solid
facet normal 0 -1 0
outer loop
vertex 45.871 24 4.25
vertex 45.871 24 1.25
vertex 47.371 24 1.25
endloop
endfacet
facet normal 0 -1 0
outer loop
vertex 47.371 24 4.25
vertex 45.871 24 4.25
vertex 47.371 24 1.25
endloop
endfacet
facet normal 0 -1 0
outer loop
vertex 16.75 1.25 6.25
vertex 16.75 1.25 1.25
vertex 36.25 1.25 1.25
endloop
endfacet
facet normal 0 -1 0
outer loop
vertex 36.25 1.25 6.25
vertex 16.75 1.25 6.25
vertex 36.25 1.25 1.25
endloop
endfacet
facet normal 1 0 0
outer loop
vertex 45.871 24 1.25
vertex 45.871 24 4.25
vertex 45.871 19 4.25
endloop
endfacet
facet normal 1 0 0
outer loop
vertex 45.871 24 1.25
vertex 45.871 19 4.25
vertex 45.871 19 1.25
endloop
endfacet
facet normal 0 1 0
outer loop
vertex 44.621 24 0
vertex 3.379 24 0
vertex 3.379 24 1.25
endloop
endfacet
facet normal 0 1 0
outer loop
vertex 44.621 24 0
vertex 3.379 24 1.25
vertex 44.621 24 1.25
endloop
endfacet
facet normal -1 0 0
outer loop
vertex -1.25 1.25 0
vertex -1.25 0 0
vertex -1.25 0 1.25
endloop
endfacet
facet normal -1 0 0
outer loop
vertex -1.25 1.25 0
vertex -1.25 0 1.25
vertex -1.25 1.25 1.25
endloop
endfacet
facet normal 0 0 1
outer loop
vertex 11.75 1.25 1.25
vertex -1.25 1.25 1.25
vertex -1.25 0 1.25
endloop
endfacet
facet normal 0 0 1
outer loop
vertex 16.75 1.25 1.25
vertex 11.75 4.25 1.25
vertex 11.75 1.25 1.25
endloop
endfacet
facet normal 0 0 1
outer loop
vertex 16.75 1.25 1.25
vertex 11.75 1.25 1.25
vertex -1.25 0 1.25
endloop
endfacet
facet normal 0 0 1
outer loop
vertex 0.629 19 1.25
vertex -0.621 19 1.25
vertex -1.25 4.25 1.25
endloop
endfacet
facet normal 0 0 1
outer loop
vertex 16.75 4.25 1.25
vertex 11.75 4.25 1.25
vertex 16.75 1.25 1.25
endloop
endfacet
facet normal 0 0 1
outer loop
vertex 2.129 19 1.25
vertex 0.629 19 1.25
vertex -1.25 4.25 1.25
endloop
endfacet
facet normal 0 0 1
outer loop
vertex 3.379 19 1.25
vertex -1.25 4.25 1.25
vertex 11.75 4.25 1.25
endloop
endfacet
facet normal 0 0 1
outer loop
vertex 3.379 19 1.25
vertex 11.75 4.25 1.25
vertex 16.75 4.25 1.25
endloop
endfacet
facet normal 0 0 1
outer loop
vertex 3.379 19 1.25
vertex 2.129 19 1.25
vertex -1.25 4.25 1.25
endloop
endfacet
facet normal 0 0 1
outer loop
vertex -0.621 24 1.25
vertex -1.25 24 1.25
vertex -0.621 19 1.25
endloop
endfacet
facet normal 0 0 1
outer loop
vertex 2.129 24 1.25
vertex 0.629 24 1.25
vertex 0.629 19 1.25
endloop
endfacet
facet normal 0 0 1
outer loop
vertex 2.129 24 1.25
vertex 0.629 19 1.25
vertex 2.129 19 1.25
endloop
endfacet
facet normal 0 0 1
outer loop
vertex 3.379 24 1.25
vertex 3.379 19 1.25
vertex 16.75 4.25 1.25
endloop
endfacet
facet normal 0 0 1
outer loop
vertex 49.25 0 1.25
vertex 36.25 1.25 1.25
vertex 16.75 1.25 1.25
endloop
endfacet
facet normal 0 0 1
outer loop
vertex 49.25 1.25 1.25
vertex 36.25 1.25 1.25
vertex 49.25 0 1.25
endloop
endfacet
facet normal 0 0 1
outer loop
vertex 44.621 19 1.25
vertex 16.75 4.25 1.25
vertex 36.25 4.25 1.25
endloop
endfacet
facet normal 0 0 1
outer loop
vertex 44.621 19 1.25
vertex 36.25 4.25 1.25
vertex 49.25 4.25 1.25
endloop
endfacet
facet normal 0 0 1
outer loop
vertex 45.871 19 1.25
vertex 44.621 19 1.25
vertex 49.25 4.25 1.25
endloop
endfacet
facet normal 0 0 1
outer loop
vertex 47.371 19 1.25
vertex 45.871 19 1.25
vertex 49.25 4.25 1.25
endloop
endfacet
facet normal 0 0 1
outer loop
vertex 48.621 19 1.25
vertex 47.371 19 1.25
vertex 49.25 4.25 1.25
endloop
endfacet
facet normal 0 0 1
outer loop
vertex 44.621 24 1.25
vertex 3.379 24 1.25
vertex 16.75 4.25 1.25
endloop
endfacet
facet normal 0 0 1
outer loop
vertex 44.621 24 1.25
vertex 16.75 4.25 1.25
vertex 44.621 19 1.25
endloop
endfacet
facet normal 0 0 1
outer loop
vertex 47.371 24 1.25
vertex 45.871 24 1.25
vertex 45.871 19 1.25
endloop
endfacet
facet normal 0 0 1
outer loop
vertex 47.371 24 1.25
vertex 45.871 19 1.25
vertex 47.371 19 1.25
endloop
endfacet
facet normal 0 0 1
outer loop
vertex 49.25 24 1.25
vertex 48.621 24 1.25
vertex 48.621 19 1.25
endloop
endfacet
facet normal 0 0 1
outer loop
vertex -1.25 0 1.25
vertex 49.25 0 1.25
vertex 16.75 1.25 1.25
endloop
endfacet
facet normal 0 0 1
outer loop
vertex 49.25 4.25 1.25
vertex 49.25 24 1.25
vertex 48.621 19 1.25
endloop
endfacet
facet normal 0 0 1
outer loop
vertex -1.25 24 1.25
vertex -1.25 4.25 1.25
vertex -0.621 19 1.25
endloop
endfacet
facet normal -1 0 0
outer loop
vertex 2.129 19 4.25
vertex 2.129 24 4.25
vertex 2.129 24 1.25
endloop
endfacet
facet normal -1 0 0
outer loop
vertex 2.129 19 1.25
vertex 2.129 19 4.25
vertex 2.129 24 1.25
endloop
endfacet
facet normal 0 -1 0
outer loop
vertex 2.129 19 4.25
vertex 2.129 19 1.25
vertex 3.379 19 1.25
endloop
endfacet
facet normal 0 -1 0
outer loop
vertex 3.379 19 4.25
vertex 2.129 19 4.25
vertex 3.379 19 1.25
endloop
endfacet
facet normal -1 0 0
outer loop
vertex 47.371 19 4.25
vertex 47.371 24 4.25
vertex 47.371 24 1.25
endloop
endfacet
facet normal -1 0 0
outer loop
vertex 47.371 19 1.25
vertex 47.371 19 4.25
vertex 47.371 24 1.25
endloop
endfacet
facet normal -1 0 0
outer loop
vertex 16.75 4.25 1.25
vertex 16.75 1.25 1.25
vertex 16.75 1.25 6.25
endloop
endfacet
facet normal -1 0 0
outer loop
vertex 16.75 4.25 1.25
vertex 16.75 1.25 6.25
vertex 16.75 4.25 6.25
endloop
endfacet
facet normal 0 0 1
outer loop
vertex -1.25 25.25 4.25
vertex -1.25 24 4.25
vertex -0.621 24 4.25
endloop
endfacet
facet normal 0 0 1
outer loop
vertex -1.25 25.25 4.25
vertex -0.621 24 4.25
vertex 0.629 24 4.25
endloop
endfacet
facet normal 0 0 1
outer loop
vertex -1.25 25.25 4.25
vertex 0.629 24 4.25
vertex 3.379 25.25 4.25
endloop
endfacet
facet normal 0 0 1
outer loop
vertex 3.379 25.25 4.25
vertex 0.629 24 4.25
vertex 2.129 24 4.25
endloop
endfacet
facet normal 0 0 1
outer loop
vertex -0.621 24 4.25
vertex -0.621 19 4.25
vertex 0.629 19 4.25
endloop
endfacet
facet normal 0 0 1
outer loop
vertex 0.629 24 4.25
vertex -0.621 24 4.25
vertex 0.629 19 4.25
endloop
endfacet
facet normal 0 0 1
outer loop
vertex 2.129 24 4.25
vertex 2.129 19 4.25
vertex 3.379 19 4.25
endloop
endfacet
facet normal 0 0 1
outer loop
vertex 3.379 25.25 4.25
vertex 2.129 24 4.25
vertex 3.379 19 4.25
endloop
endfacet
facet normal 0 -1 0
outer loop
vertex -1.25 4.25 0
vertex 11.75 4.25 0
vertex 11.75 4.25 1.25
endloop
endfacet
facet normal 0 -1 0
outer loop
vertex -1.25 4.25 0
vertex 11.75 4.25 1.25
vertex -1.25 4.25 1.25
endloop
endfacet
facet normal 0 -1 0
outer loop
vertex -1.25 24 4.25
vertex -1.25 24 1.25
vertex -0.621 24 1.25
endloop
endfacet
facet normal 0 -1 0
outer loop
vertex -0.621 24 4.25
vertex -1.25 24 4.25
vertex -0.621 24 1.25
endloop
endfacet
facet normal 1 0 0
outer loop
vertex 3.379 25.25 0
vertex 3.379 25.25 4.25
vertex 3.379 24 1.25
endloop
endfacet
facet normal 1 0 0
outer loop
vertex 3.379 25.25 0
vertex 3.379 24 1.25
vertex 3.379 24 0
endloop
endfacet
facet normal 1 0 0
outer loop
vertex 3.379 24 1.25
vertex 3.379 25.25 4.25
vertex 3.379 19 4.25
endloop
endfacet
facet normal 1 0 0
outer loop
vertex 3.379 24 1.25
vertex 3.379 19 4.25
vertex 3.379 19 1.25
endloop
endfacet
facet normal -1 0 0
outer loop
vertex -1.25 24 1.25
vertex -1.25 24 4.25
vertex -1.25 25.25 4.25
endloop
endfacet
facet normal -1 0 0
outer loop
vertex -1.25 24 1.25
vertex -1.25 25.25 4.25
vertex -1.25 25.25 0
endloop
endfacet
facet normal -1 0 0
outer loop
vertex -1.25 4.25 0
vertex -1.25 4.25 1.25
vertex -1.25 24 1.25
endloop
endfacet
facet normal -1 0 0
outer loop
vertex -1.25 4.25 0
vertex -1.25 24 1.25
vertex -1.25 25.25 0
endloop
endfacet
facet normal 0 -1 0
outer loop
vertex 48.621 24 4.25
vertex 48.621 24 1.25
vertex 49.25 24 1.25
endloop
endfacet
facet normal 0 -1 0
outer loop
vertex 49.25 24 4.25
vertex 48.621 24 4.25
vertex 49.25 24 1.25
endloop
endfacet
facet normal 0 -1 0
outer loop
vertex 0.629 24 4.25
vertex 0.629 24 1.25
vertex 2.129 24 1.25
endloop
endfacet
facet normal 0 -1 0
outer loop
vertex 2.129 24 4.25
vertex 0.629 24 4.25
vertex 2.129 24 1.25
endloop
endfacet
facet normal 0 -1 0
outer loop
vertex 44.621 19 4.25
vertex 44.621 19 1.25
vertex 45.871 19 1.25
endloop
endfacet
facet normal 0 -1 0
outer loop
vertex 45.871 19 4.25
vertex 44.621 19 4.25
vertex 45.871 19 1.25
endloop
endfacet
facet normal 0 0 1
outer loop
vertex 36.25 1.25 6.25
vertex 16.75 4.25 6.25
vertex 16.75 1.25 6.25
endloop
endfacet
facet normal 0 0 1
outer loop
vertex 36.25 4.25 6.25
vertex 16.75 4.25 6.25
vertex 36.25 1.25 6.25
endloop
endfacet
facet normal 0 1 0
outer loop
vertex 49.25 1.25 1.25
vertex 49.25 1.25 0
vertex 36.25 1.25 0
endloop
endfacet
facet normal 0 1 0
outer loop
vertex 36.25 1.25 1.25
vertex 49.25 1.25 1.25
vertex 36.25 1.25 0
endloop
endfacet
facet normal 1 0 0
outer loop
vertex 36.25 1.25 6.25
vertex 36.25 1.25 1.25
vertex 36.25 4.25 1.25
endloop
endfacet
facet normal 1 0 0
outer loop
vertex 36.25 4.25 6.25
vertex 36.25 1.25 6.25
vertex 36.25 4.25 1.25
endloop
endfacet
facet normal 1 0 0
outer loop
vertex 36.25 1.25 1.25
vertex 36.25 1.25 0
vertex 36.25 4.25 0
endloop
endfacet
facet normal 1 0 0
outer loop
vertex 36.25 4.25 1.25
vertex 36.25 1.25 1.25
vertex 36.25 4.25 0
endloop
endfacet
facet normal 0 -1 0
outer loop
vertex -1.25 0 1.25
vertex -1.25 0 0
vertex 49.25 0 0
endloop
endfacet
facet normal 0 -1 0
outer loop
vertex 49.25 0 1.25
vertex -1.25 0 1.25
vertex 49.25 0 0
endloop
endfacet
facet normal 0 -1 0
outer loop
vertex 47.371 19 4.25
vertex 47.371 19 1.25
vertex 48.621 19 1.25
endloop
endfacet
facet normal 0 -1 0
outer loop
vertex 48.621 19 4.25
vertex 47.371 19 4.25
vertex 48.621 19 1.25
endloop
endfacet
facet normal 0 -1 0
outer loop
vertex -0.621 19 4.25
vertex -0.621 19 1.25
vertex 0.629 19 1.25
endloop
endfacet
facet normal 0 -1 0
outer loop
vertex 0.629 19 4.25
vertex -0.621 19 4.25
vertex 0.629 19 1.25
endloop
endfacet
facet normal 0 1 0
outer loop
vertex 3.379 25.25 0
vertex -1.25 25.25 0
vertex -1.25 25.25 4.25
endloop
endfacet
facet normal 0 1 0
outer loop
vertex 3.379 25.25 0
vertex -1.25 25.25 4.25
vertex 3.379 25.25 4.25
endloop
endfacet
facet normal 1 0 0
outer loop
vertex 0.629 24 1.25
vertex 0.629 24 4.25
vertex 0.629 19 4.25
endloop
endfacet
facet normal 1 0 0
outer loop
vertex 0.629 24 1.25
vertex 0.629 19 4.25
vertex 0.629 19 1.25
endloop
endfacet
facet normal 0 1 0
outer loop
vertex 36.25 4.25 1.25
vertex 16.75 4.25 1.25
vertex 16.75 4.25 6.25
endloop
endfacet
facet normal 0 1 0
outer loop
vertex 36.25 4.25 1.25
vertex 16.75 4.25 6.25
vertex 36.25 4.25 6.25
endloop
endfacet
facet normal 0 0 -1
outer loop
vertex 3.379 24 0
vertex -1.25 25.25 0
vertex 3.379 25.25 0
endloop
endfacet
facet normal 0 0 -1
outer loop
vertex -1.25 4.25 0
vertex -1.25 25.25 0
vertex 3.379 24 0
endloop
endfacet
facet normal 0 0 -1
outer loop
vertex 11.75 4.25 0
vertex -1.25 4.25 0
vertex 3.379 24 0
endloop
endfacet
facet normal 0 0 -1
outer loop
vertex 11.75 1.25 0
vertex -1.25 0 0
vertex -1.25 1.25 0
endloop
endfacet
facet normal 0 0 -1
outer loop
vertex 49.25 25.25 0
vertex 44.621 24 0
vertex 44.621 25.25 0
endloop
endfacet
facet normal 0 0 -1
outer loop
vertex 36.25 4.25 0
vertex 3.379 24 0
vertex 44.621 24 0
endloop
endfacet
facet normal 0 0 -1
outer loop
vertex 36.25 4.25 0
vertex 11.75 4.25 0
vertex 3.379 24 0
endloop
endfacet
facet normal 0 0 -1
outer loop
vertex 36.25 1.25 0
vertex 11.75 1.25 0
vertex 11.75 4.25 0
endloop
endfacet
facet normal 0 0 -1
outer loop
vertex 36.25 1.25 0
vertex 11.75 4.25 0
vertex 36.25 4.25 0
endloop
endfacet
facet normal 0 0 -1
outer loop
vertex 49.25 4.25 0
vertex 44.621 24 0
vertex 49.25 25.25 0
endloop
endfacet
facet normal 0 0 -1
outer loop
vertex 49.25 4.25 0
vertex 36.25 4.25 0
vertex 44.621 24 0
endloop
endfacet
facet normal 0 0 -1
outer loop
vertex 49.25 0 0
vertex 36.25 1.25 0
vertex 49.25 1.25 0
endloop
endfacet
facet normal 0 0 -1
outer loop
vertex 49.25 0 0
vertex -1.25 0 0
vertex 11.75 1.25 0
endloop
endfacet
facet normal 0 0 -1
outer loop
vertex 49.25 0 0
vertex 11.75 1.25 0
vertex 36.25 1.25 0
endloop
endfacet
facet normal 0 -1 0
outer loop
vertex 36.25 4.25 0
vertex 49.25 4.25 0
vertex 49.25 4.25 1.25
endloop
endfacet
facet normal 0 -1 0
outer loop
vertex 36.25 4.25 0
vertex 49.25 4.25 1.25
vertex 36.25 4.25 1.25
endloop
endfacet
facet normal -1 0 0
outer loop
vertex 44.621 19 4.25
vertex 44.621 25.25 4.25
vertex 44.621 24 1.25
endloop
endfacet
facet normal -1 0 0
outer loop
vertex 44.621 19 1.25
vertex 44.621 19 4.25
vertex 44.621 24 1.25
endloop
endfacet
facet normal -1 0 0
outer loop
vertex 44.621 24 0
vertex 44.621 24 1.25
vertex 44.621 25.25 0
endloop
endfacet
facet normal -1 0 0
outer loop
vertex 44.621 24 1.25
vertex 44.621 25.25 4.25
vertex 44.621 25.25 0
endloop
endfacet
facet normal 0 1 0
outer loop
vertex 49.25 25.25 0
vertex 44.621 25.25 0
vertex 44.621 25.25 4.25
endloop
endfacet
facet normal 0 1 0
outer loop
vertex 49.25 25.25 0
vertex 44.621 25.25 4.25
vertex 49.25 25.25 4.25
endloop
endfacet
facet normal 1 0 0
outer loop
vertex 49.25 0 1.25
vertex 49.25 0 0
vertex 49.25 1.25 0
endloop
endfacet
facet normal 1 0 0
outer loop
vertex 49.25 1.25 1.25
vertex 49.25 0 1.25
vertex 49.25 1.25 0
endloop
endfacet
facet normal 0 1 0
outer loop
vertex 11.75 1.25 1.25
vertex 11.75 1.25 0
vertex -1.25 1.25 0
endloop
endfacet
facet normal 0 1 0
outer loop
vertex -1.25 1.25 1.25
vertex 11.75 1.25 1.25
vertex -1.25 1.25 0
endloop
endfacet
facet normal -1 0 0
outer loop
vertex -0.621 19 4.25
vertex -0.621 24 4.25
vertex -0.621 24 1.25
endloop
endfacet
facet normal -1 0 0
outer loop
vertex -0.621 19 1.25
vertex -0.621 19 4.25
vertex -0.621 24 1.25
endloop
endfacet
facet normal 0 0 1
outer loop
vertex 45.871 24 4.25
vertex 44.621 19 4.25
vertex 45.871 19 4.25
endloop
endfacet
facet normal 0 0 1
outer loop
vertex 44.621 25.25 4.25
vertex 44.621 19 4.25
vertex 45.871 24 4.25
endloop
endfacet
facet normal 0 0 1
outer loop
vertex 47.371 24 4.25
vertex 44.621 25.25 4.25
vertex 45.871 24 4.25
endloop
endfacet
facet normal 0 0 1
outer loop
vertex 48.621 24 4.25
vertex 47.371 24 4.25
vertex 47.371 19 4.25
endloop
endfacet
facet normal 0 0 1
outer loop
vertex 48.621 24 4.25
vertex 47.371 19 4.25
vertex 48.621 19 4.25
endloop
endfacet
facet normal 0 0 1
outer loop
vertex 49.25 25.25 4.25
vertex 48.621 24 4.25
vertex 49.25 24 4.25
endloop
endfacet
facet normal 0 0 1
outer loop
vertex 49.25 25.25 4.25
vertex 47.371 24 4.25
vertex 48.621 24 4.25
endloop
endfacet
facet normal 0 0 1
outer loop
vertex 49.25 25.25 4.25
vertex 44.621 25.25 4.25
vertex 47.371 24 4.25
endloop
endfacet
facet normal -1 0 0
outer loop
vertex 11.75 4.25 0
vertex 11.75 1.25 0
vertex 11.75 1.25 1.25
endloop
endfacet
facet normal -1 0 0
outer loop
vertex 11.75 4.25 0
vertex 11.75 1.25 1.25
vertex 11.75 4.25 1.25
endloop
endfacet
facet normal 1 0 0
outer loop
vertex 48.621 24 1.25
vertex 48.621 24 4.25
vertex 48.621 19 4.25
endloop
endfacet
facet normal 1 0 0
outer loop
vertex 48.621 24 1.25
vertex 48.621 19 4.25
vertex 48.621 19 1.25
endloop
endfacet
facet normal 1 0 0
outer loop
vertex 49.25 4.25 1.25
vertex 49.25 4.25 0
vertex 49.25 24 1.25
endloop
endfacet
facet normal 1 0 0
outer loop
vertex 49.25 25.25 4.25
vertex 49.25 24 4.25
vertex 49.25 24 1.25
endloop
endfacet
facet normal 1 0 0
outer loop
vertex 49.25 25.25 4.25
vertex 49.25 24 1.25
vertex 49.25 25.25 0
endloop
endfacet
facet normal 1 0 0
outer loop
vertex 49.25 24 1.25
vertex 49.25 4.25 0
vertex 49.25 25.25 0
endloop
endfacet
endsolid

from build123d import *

# Parameters (mm, degrees)
SKETCH1_W           = 50.5
SKETCH1_H           = 24
BOSS_EXTRUDE1_DEPTH = 1.25
SKETCH2_W           = 1.25
SKETCH2_H           = 3
BOSS_EXTRUDE2_DEPTH = 5
SKETCH3_W           = 13
SKETCH3_H           = 3
CUT_EXTRUDE1_DEPTH  = 1.25
SKETCH5_W           = 4.628536498
SKETCH5_H           = 4.25
BOSS_EXTRUDE3_DEPTH = 1.25
SKETCH9_W           = 19.5
SKETCH9_H           = 3
BOSS_EXTRUDE5_DEPTH = 5


with BuildPart() as part:
    # Sketch1 → Boss-Extrude1 (new body)
    with BuildSketch(Plane.XY):
        with Locations((24, 12)):
            Rectangle(SKETCH1_W, SKETCH1_H)
    extrude(amount=BOSS_EXTRUDE1_DEPTH)

    # Sketch2 → Boss-Extrude2 (add)
    with BuildSketch(Plane(origin=(0, 24, 0), x_dir=(1, 0, 0), z_dir=(0, 1, 0))):
        with Locations((47.996463502, -2.75)):
            Rectangle(SKETCH2_W, SKETCH2_H)
        with Locations((45.246463502, -2.75)):
            Rectangle(SKETCH2_W, SKETCH2_H)
        with Locations((2.753536498, -2.75)):
            Rectangle(SKETCH2_W, SKETCH2_H)
        with Locations((0.003536498, -2.75)):
            Rectangle(SKETCH2_W, SKETCH2_H)
    extrude(amount=-BOSS_EXTRUDE2_DEPTH)

    # Sketch3 → Cut-Extrude1 (cut)
    with BuildSketch(Plane(origin=(0, 0, 0), x_dir=(-1, 0, 0), z_dir=(0, 0, -1))):
        with Locations((-42.75, 2.75)):
            Rectangle(SKETCH3_W, SKETCH3_H)
        with Locations((-5.25, 2.75)):
            Rectangle(SKETCH3_W, SKETCH3_H)
    extrude(amount=-CUT_EXTRUDE1_DEPTH, mode=Mode.SUBTRACT)

    # Sketch5 → Boss-Extrude3 (add)
    with BuildSketch(Plane(origin=(0, 24, 0), x_dir=(1, 0, 0), z_dir=(0, 1, 0))):
        with Locations((1.064268249, -2.125)):
            Rectangle(SKETCH5_W, SKETCH5_H)
        with Locations((46.935731751, -2.125)):
            Rectangle(SKETCH5_W, SKETCH5_H)
    extrude(amount=BOSS_EXTRUDE3_DEPTH)

    # Sketch9 → Boss-Extrude5 (add)
    with BuildSketch(Plane.XY.offset(1.25)):
        with Locations((26.5, 2.75)):
            Rectangle(SKETCH9_W, SKETCH9_H)
    extrude(amount=BOSS_EXTRUDE5_DEPTH)


solid = part.part
